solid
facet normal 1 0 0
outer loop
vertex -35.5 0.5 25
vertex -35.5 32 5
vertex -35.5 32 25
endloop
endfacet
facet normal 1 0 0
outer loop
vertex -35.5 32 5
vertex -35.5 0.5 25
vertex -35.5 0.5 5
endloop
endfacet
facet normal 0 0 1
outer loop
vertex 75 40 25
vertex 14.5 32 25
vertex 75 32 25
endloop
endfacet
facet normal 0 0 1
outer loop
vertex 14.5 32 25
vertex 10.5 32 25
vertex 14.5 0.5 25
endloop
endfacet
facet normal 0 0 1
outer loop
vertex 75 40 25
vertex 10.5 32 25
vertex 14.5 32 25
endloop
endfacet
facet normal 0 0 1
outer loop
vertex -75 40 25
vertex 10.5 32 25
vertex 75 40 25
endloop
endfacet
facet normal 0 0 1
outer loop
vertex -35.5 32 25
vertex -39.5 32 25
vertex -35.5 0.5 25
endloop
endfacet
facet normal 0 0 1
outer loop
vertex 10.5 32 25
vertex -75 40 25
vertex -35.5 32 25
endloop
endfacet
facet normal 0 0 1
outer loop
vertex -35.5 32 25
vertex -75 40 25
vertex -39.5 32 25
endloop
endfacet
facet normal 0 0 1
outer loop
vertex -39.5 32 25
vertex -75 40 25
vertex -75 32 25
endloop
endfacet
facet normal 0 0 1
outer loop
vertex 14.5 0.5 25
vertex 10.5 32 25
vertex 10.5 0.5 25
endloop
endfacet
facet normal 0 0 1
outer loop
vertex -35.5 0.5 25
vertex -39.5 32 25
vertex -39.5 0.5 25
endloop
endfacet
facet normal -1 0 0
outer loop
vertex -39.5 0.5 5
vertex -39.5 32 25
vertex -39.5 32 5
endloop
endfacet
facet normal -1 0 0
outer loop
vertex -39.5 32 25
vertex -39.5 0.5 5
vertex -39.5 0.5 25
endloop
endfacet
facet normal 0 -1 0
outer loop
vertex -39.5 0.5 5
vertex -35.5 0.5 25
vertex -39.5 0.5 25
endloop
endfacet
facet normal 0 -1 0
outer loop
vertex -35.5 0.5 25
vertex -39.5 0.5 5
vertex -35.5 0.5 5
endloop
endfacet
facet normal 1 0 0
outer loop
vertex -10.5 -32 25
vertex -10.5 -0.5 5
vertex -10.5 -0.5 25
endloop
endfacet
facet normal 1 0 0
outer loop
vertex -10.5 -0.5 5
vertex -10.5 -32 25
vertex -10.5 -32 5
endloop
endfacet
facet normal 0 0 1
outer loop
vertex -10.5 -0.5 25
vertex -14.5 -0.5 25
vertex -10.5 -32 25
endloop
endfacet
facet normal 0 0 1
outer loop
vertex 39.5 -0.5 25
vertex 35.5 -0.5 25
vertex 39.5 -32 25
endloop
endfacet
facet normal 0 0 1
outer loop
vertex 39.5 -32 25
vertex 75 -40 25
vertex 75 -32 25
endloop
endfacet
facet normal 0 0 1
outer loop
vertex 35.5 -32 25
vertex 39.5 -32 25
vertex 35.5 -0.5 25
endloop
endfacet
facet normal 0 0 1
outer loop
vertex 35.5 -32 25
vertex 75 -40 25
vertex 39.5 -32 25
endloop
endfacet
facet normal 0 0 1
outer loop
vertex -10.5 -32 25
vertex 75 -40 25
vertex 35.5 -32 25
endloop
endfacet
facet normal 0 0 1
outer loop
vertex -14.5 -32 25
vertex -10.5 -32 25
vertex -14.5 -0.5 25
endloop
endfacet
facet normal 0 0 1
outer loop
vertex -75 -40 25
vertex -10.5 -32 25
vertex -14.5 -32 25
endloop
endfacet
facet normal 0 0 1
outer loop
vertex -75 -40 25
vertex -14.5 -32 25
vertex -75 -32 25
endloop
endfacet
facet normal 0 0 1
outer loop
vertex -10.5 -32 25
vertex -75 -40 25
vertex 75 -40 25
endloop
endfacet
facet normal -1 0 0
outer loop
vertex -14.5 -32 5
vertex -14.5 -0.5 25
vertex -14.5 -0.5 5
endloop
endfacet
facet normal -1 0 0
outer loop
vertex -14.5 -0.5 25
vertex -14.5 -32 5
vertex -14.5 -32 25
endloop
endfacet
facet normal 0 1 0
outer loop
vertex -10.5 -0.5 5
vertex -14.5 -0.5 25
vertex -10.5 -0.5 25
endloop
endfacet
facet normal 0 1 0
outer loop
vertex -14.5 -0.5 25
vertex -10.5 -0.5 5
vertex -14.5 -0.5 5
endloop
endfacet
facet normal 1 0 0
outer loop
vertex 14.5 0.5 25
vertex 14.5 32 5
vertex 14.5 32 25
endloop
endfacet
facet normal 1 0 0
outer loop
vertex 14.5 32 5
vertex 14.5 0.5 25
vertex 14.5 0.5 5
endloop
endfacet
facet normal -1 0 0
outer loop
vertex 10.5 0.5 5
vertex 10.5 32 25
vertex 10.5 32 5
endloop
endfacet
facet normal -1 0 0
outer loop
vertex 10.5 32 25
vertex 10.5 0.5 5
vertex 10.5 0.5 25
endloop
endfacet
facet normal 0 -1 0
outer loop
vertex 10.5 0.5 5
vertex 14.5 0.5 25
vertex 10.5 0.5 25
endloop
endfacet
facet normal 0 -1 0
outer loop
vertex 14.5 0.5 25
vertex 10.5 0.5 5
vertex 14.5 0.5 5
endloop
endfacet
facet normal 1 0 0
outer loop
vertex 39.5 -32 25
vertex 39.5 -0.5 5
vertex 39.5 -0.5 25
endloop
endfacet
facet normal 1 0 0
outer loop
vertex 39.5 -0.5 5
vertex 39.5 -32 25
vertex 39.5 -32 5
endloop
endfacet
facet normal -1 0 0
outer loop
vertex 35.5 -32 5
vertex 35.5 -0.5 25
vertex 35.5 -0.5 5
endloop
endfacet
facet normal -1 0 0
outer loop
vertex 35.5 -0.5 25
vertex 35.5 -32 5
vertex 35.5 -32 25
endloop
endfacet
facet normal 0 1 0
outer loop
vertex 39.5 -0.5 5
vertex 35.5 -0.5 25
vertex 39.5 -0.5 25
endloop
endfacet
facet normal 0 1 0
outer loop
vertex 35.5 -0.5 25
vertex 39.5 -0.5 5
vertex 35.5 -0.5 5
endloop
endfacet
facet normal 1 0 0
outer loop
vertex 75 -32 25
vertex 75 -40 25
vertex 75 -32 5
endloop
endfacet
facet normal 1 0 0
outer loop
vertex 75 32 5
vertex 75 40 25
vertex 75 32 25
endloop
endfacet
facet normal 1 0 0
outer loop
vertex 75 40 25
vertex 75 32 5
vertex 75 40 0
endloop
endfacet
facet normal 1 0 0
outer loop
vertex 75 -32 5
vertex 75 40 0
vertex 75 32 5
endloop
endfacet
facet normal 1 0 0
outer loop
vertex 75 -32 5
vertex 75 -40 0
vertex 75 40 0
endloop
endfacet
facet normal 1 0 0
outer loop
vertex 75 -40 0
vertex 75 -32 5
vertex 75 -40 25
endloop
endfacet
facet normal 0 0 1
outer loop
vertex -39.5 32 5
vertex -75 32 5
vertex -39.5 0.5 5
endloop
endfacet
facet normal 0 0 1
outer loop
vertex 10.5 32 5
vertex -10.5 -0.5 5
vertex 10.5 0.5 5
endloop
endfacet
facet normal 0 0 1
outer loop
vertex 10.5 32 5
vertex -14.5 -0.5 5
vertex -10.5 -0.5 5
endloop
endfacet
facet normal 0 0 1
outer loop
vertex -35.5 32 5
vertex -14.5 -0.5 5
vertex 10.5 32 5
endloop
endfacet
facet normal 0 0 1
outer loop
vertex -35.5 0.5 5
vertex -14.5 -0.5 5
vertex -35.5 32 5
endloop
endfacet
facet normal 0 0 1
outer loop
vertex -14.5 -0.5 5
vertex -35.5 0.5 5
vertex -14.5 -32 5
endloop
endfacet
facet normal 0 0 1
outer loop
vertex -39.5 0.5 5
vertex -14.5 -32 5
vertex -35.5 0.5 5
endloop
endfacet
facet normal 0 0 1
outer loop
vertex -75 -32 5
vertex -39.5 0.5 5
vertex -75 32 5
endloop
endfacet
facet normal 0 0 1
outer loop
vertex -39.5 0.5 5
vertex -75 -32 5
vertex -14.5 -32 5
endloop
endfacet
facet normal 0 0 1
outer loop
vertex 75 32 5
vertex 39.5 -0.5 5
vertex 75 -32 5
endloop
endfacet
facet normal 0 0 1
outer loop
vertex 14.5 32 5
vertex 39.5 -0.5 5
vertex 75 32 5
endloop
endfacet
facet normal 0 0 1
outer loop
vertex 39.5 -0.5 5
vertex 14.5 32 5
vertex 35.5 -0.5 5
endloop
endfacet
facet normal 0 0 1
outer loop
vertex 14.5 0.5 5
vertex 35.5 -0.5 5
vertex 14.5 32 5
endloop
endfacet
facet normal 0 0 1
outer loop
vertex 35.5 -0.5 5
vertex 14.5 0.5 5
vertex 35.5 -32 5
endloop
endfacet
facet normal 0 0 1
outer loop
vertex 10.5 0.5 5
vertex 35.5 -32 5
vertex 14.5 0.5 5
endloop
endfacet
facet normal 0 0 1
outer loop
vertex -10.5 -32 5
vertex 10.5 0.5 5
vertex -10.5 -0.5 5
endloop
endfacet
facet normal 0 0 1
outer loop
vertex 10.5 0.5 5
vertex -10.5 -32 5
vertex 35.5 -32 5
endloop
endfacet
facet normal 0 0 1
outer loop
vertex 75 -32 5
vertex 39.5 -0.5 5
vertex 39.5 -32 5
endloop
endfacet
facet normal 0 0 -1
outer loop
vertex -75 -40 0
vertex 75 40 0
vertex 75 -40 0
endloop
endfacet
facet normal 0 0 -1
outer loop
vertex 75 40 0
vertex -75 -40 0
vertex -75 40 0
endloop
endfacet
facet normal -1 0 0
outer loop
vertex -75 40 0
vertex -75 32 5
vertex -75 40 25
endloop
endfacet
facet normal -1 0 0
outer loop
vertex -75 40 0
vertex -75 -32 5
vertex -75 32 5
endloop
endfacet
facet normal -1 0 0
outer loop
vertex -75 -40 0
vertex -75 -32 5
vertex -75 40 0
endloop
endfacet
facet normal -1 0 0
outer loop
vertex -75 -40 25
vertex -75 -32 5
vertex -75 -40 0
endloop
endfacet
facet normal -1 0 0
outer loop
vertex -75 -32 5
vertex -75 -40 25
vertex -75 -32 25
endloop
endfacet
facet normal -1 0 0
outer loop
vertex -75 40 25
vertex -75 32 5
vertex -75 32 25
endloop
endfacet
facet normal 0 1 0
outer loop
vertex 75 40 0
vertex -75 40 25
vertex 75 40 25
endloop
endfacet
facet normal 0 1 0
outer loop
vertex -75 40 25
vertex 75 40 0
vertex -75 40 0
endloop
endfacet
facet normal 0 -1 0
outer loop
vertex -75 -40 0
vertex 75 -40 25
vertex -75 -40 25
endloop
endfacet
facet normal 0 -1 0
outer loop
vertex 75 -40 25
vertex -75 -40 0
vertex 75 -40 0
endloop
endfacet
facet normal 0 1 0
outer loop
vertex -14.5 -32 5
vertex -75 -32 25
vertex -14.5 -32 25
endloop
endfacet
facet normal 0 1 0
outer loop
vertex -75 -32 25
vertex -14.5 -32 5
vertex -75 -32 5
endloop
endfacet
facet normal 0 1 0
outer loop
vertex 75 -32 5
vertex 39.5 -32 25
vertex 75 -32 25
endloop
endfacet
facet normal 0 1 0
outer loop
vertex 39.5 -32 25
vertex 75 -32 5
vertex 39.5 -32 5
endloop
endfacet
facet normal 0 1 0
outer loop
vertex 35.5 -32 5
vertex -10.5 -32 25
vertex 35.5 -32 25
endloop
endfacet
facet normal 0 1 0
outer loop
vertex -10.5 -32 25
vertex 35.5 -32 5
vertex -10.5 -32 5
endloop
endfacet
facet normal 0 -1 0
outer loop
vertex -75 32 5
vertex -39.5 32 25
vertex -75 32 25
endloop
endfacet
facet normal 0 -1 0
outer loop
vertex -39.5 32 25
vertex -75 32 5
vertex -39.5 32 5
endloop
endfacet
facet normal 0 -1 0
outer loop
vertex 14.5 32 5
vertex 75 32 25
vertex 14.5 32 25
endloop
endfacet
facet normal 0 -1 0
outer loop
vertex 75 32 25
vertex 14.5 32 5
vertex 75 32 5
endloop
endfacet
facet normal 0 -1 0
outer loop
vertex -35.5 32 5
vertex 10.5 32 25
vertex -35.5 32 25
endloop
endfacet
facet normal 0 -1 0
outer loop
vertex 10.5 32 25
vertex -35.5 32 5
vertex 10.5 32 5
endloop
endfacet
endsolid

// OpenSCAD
$fn = 32;

// ----------------------------------------------------------------------
// Rib frame 150 x 80 x 25
// 4 ribs at 25 mm pitch, staggered
// ----------------------------------------------------------------------

// --- parameters (mm) ---
frame = [150, 80, 5];  // base plate size (x, y, z)
rail_w = 8;            // side rail width
ribs = 4;              // number of ribs
rib_t = 4;             // rib thickness
rib_h = 20;            // rib height above the base plate
pitch = 25;            // pitch between rib centres

// --- derived feature positions (mm) ---
span = (ribs - 1) * pitch;          // = 75   distance between the outer ribs
origin_x = -span / 2;               // = -37.5   X of the first rib
rib_len = frame[1] / 2 - rail_w + 0.5;  // = 32.5   length of a staggered rib
rib_y = 0.5 + rib_len / 2;          // = 16.75   Y of a staggered rib centre
row_offset = 2 * rib_y;             // = 33.5   distance between the two rows
feature_centers = [
  [origin_x + 0 * pitch, rib_y],
  [origin_x + 1 * pitch, -rib_y],
  [origin_x + 2 * pitch, rib_y],
  [origin_x + 3 * pitch, -rib_y]
];   // rib centre line, drives the rib loop

// base plate, two side rails, then the ribs read straight off feature_centers
union() {
  translate([-frame[0] / 2, -frame[1] / 2, 0]) cube(frame);
  translate([-frame[0] / 2, -frame[1] / 2, 0]) cube([frame[0], rail_w, frame[2] + rib_h]);
  translate([-frame[0] / 2, frame[1] / 2 - rail_w, 0]) cube([frame[0], rail_w, frame[2] + rib_h]);
  for (centre = feature_centers)
    translate([centre[0] - rib_t / 2, centre[1] - rib_len / 2, frame[2] - 1])
      cube([rib_t, rib_len, rib_h + 1]);
}
